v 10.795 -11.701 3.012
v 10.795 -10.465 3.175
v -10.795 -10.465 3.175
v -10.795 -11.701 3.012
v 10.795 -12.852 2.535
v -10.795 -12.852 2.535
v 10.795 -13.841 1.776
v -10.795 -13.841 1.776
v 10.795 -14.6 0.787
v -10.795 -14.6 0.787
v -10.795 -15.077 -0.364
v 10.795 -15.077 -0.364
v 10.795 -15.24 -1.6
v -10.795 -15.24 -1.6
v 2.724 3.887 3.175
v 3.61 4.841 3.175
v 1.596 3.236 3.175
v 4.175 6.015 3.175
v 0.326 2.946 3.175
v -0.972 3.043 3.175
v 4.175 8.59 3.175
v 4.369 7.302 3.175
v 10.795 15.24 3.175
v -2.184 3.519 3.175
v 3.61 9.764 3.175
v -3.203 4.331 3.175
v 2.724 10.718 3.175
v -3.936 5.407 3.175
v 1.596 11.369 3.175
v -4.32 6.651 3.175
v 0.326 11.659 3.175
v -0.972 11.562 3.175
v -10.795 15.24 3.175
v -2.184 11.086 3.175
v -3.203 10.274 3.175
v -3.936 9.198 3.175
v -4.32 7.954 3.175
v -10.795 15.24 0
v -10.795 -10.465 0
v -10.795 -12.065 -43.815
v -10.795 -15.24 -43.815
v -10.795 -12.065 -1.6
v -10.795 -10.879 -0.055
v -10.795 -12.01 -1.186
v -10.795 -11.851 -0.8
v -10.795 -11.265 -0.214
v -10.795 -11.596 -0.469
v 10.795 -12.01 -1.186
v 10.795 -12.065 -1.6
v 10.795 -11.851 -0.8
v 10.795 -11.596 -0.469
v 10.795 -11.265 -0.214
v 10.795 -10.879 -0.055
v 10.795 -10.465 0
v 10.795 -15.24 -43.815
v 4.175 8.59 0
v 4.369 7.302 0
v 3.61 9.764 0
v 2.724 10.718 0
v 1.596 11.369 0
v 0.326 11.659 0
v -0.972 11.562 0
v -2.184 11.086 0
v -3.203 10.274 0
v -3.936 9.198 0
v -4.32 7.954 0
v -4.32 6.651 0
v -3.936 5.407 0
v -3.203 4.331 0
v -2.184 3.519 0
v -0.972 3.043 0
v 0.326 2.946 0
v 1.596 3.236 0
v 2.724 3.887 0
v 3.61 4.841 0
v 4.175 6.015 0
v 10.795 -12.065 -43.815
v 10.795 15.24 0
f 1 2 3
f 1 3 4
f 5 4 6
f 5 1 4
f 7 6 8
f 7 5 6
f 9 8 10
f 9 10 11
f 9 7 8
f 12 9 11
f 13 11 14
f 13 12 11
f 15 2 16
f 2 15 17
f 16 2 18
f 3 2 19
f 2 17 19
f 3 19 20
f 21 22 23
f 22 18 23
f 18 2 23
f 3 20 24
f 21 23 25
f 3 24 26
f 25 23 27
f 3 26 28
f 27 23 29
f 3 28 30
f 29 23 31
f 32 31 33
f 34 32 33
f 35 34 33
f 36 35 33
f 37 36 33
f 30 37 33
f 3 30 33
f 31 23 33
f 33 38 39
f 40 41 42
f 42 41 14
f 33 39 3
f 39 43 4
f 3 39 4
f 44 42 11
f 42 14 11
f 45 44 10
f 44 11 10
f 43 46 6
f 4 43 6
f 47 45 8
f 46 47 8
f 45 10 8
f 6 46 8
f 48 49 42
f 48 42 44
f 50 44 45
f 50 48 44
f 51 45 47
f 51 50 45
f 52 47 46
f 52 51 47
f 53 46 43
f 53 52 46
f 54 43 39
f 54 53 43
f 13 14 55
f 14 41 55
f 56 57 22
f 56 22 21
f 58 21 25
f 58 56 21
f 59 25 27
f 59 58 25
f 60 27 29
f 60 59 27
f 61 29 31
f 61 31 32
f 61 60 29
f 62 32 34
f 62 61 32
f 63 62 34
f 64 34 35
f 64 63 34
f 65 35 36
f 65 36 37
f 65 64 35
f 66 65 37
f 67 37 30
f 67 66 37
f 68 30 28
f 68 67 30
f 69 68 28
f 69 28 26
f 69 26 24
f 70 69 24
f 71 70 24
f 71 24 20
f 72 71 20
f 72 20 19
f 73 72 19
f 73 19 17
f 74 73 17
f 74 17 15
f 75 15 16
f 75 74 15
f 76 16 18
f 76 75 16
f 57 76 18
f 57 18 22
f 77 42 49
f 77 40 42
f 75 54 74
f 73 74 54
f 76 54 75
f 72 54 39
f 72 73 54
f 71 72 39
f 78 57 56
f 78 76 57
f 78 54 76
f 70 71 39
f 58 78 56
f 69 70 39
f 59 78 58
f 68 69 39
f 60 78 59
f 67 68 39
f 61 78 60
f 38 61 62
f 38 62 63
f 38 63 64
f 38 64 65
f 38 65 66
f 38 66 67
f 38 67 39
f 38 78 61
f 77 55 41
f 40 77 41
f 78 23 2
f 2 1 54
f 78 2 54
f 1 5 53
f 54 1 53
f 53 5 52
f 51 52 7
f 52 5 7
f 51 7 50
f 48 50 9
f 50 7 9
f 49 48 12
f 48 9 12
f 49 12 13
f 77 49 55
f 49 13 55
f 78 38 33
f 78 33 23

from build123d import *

# Parameters (mm, degrees)
SKETCH1_R                    = 4.3688
BOSS_EXTRUDE1_DEPTH          = 3.175
EDGE_FLANGE1_STRIP_W         = 15.900000204
EDGE_FLANGE1_STRIP_H         = 3.175
EDGE_FLANGE1_STRIP_CUT_DEPTH = 21.59
EDGE_FLANGE1_DEPTH           = 21.59
EDGE_FLANGE1_FLAT_DEPTH      = 3.175


# Sheet-metal steps are written as plain solids
with BuildPart() as part:
    # Sketch1 → Boss-Extrude1 (new body)
    with BuildSketch(Plane.XY):
        Polygon((-10.795, 15.24), (10.795, 15.24), (10.795, -15.24), (-10.795, -15.24), (-10.795, -1.27), align=None)
        with Locations((0, 7.3025)):
            Circle(SKETCH1_R, mode=Mode.SUBTRACT)
    extrude(amount=BOSS_EXTRUDE1_DEPTH)

    # Edge-Flange1 strip (across the edge) → Edge-Flange1 strip cut (cut)
    with BuildSketch(Plane(origin=(10.795, -15.24, 0), x_dir=(0, 1, 0), z_dir=(-1, 0, 0))):
        with Locations((-3.175, -1.5875)):
            Rectangle(EDGE_FLANGE1_STRIP_W, EDGE_FLANGE1_STRIP_H)
    extrude(amount=EDGE_FLANGE1_STRIP_CUT_DEPTH, mode=Mode.SUBTRACT)

    # Edge-Flange1 bend section (across the edge) → Edge-Flange1 (add)
    with BuildSketch(Plane(origin=(10.795, -15.24, 0), x_dir=(0, 1, 0), z_dir=(-1, 0, 0))):
        with BuildLine():
            Line((0, 1.600000102), (3.175, 1.600000102))
            ThreePointArc((3.175, 1.600000102), (3.64362918, 0.46862918), (4.775000102, 0))
            Line((4.775000102, 0), (4.775000102, -3.175))
            ThreePointArc((4.775000102, -3.175), (1.39856515, -1.77643485), (0, 1.600000102))
        make_face()
    extrude(amount=EDGE_FLANGE1_DEPTH)

    # Edge-Flange1 profile (on flange) → Edge-Flange1 flat (add)
    with BuildSketch(Plane(origin=(0, -15.24, 0), x_dir=(1, 0, 0), z_dir=(0, 1, 0))):
        Polygon((-10.795, 1.600000102), (10.795, 1.600000102), (10.795, 13.335), (10.795, 34.925), (10.795, 43.815), (-10.795, 43.815), (-10.795, 34.925), (-10.795, 13.335), align=None)
    extrude(amount=EDGE_FLANGE1_FLAT_DEPTH)


solid = part.part
